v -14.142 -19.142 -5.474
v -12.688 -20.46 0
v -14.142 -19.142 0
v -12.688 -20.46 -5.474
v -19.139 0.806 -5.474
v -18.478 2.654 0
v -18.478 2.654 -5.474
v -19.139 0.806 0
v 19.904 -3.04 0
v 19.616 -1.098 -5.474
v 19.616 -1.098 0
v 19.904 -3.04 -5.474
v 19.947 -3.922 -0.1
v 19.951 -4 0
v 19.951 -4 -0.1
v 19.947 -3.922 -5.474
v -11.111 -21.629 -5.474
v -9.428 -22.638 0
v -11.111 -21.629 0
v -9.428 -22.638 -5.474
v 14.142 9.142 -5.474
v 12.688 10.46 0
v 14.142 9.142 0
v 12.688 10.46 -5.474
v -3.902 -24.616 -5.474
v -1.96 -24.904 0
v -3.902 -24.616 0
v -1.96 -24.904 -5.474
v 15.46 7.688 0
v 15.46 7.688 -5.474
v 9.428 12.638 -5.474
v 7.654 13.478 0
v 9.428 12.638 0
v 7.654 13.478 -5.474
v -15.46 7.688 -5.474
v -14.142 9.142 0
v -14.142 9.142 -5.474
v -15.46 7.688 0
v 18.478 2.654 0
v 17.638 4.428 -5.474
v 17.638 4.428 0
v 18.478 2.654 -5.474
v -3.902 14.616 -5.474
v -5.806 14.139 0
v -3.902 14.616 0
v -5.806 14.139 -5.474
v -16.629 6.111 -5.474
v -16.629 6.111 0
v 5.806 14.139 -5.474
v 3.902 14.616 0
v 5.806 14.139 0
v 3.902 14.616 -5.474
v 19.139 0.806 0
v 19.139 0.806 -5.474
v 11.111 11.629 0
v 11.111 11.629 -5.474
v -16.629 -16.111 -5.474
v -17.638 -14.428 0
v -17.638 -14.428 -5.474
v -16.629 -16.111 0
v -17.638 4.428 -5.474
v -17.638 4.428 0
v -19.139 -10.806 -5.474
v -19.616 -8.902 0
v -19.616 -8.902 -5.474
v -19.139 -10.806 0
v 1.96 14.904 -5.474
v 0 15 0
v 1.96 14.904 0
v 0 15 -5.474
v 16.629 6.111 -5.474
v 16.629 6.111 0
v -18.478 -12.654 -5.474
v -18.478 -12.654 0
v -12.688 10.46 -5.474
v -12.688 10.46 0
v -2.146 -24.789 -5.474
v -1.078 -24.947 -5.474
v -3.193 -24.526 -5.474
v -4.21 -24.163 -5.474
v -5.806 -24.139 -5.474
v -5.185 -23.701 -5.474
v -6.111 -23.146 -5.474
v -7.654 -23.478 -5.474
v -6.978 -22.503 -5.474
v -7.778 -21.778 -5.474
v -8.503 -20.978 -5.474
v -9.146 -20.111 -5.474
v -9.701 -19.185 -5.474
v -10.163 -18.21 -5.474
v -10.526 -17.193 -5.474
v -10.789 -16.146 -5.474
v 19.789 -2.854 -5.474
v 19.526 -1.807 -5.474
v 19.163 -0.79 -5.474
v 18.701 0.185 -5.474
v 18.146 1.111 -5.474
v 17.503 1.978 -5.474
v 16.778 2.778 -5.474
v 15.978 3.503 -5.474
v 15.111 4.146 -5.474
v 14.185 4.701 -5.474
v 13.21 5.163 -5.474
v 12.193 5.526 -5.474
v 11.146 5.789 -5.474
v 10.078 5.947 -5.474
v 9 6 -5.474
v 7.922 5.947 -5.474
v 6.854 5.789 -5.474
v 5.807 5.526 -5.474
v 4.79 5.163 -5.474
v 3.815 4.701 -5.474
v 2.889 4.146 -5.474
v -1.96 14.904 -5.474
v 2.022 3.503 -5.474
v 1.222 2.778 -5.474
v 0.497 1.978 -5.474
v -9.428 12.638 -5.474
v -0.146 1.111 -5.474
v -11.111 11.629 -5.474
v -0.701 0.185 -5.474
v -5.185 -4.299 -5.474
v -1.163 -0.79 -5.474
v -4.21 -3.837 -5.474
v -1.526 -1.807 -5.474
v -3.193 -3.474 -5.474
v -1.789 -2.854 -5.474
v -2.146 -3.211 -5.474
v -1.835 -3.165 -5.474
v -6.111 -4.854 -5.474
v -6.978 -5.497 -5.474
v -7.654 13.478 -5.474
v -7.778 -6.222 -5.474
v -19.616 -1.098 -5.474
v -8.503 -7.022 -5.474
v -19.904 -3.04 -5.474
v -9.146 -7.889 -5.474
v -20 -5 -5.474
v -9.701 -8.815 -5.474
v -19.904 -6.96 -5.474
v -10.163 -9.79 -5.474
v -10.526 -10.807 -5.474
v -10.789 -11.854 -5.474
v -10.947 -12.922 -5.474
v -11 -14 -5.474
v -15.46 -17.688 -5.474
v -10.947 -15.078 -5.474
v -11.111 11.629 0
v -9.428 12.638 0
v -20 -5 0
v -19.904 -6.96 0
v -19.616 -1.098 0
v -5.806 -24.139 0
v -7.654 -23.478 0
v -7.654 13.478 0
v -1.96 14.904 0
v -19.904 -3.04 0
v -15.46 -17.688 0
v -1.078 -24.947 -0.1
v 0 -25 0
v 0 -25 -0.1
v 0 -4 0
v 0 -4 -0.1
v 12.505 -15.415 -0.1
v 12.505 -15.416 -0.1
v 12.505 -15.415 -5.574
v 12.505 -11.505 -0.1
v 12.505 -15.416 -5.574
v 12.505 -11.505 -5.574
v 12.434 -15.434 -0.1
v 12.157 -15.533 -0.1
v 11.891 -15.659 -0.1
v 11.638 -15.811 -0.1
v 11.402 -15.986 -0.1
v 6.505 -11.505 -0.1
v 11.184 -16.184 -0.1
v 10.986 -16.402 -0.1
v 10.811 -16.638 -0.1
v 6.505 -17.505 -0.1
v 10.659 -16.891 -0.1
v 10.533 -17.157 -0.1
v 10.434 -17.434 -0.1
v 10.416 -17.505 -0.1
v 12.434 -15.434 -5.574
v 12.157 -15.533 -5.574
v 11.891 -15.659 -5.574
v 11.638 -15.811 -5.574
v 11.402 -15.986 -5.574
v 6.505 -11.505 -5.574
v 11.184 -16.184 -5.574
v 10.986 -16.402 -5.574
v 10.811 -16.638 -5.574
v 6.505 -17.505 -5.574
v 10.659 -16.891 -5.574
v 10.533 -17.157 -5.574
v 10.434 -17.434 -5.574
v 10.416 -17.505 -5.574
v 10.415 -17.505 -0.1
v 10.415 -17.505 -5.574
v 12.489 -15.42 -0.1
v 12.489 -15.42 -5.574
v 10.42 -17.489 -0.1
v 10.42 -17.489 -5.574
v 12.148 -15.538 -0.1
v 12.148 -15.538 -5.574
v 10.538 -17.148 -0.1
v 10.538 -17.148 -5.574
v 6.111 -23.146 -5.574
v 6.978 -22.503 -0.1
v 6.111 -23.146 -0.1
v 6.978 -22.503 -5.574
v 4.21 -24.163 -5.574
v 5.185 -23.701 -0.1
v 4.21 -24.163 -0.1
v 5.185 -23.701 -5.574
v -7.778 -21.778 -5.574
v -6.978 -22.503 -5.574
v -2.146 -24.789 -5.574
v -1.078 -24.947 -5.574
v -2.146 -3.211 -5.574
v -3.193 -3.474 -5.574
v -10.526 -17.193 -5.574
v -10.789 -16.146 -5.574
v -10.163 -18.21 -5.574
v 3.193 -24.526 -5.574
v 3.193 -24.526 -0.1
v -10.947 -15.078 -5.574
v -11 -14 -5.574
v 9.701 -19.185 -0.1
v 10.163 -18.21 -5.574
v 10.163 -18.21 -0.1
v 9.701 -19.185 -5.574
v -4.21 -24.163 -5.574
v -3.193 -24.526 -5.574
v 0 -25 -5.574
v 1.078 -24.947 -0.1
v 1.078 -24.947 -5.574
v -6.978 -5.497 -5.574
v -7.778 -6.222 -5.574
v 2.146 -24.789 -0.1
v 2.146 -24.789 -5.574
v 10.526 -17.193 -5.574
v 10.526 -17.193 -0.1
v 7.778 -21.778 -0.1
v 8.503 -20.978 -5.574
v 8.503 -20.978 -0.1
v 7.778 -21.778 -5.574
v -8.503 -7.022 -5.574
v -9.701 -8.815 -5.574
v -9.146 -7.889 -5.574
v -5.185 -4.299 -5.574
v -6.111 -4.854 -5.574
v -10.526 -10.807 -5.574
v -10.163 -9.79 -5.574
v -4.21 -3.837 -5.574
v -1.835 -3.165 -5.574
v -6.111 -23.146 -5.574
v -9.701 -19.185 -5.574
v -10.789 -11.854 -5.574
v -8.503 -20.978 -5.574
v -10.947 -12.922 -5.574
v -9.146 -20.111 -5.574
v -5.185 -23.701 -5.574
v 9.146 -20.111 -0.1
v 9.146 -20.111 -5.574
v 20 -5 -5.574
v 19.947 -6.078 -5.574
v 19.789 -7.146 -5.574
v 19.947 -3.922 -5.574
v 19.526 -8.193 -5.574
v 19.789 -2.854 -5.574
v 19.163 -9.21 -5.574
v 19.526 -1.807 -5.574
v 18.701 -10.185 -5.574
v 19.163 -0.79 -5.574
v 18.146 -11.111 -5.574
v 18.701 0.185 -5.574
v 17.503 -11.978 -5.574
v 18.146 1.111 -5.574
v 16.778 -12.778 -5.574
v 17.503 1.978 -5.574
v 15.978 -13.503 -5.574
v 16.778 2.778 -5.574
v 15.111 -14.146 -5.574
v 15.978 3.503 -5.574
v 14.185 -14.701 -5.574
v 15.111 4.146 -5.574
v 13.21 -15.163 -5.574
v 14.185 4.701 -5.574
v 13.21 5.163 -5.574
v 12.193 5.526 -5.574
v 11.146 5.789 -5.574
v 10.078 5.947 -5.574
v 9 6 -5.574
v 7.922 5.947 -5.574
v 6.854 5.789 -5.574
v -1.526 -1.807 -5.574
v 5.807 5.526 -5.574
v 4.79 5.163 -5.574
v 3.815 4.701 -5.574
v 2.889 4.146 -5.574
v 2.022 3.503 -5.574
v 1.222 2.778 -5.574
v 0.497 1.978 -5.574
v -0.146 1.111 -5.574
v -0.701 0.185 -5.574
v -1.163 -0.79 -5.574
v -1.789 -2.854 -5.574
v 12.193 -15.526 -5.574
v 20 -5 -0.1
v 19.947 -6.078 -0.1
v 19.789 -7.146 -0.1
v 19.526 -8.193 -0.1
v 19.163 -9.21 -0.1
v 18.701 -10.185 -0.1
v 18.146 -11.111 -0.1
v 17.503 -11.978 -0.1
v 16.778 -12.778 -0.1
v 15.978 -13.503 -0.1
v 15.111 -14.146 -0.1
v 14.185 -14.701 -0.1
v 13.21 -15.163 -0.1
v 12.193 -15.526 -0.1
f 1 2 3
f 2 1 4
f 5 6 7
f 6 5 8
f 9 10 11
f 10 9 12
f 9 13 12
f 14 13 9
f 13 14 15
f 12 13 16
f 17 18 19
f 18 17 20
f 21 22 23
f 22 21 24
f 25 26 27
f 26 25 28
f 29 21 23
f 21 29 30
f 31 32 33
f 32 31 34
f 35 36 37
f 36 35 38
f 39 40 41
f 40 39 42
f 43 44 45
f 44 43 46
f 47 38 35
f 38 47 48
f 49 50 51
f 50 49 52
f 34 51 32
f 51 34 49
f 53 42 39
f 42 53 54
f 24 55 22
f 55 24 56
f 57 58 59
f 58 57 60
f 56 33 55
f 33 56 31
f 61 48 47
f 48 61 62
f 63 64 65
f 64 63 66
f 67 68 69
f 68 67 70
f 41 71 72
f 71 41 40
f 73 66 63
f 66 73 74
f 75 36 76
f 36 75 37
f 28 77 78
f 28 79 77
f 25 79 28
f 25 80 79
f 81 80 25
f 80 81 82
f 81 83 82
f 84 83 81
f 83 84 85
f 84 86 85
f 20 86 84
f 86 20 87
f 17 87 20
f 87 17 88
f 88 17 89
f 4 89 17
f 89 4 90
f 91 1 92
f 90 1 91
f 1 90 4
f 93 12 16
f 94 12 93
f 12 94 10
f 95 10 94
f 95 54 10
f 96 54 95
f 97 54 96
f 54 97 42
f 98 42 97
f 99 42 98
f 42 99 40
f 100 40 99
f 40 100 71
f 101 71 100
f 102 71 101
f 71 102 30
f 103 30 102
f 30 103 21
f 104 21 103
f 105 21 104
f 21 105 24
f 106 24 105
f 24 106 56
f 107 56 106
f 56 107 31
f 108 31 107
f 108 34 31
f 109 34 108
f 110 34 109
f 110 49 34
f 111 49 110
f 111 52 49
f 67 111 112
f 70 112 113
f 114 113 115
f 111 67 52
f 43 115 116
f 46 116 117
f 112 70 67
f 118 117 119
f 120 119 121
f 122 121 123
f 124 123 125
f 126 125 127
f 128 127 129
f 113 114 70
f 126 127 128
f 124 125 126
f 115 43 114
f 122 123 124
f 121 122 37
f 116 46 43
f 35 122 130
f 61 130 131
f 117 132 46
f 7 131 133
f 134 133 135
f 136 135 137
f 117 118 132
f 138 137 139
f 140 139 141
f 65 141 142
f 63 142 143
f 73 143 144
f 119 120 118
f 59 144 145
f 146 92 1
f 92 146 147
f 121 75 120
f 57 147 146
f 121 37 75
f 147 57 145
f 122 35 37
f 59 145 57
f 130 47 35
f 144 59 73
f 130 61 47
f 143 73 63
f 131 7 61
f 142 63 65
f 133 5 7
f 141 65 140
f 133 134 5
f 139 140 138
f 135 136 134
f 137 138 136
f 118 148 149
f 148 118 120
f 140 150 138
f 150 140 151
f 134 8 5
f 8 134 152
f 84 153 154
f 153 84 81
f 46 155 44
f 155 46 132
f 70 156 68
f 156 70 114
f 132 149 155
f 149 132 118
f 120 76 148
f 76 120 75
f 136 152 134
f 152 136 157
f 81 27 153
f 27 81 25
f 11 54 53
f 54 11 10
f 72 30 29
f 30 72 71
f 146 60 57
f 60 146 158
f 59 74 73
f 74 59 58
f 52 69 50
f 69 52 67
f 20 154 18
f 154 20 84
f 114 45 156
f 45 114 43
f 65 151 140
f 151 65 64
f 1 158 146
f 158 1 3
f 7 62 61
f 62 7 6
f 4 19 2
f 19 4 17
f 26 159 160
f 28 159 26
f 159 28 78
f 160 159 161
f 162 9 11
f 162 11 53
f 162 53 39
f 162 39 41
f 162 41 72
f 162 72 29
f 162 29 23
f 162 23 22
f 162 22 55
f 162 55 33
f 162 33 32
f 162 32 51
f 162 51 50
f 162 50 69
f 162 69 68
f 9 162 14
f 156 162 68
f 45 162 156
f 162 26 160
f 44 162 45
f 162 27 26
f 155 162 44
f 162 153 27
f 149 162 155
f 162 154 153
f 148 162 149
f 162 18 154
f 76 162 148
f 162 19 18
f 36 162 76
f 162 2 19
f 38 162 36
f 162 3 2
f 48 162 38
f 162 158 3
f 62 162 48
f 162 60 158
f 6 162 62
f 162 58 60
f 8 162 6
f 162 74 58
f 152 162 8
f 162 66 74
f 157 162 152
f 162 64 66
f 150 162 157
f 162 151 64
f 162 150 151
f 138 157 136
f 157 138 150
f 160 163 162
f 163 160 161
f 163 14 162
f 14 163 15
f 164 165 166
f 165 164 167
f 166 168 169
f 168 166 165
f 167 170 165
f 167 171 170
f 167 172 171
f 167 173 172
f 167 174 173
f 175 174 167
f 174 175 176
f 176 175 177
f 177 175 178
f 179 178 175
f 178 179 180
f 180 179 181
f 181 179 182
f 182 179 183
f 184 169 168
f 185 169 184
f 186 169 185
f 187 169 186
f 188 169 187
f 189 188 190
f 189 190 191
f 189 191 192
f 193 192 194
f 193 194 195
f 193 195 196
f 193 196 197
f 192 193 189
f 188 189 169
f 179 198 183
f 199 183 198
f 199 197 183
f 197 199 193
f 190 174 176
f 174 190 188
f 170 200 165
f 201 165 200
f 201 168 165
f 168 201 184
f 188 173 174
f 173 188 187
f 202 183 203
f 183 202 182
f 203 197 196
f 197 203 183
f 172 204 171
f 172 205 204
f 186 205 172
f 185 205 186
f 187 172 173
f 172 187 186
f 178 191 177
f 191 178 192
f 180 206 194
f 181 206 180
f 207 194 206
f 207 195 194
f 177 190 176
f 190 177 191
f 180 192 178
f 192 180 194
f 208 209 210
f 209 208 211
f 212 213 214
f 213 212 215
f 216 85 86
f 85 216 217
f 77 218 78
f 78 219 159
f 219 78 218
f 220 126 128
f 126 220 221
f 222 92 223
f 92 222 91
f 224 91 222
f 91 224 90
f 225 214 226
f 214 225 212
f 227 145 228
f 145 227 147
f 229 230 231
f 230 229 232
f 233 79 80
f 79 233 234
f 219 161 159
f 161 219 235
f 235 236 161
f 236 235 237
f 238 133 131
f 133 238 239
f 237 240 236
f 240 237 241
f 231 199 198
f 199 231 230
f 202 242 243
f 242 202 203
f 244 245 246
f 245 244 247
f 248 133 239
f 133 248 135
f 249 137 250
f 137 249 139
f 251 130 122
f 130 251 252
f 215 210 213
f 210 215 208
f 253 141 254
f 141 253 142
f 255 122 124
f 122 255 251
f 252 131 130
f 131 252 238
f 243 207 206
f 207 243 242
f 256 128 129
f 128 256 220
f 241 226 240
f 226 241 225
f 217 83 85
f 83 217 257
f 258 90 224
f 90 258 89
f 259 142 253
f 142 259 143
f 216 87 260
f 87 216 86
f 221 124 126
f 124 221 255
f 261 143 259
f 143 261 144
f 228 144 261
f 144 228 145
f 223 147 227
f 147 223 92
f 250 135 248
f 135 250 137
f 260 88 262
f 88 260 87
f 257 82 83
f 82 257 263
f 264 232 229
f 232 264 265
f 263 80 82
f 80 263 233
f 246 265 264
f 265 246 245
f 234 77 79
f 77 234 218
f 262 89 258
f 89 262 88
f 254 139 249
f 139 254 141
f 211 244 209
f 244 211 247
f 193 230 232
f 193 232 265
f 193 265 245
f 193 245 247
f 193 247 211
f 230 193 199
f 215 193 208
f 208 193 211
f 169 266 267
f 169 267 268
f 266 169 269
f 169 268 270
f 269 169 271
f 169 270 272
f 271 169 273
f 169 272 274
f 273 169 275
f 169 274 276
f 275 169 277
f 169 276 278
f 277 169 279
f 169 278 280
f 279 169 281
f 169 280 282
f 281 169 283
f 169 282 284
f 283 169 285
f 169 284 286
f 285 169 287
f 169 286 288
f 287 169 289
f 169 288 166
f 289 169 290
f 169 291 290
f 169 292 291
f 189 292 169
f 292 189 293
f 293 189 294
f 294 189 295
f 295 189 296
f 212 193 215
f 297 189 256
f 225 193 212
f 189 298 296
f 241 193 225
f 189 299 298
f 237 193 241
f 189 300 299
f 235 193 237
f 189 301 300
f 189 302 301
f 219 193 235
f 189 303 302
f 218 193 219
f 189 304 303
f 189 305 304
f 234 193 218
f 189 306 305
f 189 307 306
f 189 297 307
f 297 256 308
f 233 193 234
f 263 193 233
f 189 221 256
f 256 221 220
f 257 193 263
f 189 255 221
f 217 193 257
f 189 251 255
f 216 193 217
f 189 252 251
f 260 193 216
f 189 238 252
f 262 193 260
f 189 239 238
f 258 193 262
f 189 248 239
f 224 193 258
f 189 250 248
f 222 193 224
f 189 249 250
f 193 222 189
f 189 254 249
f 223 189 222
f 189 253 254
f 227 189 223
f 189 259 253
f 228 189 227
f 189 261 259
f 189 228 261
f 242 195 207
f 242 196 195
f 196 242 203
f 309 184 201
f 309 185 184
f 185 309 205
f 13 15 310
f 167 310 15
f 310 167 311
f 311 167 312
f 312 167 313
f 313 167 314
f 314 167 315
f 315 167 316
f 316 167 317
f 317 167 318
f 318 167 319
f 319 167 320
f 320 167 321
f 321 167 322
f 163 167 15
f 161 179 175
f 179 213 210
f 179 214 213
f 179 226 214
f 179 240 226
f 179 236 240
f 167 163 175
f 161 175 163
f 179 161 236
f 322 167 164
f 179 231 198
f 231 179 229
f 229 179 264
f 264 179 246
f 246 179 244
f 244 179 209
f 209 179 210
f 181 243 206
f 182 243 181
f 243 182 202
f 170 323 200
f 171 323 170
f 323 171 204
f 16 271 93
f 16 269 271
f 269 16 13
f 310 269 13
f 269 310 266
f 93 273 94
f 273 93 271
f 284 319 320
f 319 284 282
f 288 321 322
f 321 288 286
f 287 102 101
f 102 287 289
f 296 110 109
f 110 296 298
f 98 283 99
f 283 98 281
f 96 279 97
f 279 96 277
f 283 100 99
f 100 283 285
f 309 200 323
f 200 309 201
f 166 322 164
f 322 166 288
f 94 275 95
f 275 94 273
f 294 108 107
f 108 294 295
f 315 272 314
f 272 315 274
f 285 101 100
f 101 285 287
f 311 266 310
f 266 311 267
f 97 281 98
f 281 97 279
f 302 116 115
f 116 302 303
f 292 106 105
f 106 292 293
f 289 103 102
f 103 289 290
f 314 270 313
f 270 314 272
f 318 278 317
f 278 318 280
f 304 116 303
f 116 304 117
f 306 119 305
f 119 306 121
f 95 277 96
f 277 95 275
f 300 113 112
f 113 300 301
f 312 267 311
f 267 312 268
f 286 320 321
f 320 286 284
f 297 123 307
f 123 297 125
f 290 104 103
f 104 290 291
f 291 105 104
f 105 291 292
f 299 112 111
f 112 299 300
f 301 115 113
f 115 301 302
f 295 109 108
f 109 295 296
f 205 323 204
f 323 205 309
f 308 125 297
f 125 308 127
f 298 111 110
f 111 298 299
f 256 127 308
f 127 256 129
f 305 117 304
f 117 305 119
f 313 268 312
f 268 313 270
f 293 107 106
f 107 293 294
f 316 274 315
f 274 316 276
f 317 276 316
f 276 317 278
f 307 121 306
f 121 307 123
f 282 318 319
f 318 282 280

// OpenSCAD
//  Micro Stockport Frog
//
//  Reverse engineered from photos of the real Stockport Frog
//  see https://stockportsgiantleap.co.uk/
//
//  micro-stockport-frog-v4.scad - 3D printable Stockport Frog by Steve Nicklin
//  Copyright (C) 2019  Steve Nicklin		                            
//
//  This program is free software; you can redistribute it and\or modify    
//  it under the terms of the GNU General Public License as published by    
//  the Free Software Foundation; either version 3 of the License, or       
//  (at your option) any later version.                                     
//  This program is distributed in the hope that it will be useful,         
//  but WITHOUT ANY WARRANTY; without even the implied warranty of          
//  MERCHANTABILITY or FITNESS FOR A PARTICULAR PURPOSE.  See the           
//  GNU General Public License for more details.                            
//  You should have received a copy of the GNU General Public License       
//  along with this program; if not, write to the Free Software Foundation, 
//  Inc., 51 Franklin Street, Fifth Floor, Boston, MA 02110-1301  USA       
//                                                                          
//  You can contact the author at steve@stevenicklin.com                    
//
//  Change History
//  Date        Ver Description
//  --------------------------------------------------------------------------------------
//  20190616    V1  Base print for first few micro frogs
//  20190619    V2  Added front feet and toes
//  20190620    V3  Added rear leags, feet and toes
//  20190622    V3-split  Same as V3 but model split into frog and hat
//  20190626    V4  Added lilypad base
//  --------------------------------------------------------------------------------------


$fn = 64;

HATHGT = 13.4;

LILYDEP = HATHGT * (40.85/100);
LILYRAD1 = 20;
LILYRAD2 = 11;
LILYRAD3 = 3;


translate([0,-5,-LILYDEP])
{
    lilypad();
}

module lilypad()
{
    color("green")
    {
        difference()
        {
            cylinder(r=LILYRAD1,h=LILYDEP);
            translate([0,-LILYRAD1,-0.1])
            cube([LILYRAD1+1,LILYRAD1+1,LILYDEP+0.2]);
        }
        translate([0,-LILYRAD1+LILYRAD2,-0.1])
            cylinder(r=LILYRAD2,h=LILYDEP);
        translate([LILYRAD1-LILYRAD2,0,-0.1])
            cylinder(r=LILYRAD2,h=LILYDEP);
        translate([LILYRAD1-LILYRAD2+LILYRAD3+1.305,
                  -LILYRAD1+LILYRAD2-LILYRAD3-1.305,-0.1])
        difference()
        {
                translate([-LILYRAD3*2-0.8,0.8,0])
                cube([LILYRAD3*2,LILYRAD3*2,LILYDEP]);
                translate([0,0,-0.1])
                cylinder(r=LILYRAD3,h=LILYDEP*2);
        }
    }
}
